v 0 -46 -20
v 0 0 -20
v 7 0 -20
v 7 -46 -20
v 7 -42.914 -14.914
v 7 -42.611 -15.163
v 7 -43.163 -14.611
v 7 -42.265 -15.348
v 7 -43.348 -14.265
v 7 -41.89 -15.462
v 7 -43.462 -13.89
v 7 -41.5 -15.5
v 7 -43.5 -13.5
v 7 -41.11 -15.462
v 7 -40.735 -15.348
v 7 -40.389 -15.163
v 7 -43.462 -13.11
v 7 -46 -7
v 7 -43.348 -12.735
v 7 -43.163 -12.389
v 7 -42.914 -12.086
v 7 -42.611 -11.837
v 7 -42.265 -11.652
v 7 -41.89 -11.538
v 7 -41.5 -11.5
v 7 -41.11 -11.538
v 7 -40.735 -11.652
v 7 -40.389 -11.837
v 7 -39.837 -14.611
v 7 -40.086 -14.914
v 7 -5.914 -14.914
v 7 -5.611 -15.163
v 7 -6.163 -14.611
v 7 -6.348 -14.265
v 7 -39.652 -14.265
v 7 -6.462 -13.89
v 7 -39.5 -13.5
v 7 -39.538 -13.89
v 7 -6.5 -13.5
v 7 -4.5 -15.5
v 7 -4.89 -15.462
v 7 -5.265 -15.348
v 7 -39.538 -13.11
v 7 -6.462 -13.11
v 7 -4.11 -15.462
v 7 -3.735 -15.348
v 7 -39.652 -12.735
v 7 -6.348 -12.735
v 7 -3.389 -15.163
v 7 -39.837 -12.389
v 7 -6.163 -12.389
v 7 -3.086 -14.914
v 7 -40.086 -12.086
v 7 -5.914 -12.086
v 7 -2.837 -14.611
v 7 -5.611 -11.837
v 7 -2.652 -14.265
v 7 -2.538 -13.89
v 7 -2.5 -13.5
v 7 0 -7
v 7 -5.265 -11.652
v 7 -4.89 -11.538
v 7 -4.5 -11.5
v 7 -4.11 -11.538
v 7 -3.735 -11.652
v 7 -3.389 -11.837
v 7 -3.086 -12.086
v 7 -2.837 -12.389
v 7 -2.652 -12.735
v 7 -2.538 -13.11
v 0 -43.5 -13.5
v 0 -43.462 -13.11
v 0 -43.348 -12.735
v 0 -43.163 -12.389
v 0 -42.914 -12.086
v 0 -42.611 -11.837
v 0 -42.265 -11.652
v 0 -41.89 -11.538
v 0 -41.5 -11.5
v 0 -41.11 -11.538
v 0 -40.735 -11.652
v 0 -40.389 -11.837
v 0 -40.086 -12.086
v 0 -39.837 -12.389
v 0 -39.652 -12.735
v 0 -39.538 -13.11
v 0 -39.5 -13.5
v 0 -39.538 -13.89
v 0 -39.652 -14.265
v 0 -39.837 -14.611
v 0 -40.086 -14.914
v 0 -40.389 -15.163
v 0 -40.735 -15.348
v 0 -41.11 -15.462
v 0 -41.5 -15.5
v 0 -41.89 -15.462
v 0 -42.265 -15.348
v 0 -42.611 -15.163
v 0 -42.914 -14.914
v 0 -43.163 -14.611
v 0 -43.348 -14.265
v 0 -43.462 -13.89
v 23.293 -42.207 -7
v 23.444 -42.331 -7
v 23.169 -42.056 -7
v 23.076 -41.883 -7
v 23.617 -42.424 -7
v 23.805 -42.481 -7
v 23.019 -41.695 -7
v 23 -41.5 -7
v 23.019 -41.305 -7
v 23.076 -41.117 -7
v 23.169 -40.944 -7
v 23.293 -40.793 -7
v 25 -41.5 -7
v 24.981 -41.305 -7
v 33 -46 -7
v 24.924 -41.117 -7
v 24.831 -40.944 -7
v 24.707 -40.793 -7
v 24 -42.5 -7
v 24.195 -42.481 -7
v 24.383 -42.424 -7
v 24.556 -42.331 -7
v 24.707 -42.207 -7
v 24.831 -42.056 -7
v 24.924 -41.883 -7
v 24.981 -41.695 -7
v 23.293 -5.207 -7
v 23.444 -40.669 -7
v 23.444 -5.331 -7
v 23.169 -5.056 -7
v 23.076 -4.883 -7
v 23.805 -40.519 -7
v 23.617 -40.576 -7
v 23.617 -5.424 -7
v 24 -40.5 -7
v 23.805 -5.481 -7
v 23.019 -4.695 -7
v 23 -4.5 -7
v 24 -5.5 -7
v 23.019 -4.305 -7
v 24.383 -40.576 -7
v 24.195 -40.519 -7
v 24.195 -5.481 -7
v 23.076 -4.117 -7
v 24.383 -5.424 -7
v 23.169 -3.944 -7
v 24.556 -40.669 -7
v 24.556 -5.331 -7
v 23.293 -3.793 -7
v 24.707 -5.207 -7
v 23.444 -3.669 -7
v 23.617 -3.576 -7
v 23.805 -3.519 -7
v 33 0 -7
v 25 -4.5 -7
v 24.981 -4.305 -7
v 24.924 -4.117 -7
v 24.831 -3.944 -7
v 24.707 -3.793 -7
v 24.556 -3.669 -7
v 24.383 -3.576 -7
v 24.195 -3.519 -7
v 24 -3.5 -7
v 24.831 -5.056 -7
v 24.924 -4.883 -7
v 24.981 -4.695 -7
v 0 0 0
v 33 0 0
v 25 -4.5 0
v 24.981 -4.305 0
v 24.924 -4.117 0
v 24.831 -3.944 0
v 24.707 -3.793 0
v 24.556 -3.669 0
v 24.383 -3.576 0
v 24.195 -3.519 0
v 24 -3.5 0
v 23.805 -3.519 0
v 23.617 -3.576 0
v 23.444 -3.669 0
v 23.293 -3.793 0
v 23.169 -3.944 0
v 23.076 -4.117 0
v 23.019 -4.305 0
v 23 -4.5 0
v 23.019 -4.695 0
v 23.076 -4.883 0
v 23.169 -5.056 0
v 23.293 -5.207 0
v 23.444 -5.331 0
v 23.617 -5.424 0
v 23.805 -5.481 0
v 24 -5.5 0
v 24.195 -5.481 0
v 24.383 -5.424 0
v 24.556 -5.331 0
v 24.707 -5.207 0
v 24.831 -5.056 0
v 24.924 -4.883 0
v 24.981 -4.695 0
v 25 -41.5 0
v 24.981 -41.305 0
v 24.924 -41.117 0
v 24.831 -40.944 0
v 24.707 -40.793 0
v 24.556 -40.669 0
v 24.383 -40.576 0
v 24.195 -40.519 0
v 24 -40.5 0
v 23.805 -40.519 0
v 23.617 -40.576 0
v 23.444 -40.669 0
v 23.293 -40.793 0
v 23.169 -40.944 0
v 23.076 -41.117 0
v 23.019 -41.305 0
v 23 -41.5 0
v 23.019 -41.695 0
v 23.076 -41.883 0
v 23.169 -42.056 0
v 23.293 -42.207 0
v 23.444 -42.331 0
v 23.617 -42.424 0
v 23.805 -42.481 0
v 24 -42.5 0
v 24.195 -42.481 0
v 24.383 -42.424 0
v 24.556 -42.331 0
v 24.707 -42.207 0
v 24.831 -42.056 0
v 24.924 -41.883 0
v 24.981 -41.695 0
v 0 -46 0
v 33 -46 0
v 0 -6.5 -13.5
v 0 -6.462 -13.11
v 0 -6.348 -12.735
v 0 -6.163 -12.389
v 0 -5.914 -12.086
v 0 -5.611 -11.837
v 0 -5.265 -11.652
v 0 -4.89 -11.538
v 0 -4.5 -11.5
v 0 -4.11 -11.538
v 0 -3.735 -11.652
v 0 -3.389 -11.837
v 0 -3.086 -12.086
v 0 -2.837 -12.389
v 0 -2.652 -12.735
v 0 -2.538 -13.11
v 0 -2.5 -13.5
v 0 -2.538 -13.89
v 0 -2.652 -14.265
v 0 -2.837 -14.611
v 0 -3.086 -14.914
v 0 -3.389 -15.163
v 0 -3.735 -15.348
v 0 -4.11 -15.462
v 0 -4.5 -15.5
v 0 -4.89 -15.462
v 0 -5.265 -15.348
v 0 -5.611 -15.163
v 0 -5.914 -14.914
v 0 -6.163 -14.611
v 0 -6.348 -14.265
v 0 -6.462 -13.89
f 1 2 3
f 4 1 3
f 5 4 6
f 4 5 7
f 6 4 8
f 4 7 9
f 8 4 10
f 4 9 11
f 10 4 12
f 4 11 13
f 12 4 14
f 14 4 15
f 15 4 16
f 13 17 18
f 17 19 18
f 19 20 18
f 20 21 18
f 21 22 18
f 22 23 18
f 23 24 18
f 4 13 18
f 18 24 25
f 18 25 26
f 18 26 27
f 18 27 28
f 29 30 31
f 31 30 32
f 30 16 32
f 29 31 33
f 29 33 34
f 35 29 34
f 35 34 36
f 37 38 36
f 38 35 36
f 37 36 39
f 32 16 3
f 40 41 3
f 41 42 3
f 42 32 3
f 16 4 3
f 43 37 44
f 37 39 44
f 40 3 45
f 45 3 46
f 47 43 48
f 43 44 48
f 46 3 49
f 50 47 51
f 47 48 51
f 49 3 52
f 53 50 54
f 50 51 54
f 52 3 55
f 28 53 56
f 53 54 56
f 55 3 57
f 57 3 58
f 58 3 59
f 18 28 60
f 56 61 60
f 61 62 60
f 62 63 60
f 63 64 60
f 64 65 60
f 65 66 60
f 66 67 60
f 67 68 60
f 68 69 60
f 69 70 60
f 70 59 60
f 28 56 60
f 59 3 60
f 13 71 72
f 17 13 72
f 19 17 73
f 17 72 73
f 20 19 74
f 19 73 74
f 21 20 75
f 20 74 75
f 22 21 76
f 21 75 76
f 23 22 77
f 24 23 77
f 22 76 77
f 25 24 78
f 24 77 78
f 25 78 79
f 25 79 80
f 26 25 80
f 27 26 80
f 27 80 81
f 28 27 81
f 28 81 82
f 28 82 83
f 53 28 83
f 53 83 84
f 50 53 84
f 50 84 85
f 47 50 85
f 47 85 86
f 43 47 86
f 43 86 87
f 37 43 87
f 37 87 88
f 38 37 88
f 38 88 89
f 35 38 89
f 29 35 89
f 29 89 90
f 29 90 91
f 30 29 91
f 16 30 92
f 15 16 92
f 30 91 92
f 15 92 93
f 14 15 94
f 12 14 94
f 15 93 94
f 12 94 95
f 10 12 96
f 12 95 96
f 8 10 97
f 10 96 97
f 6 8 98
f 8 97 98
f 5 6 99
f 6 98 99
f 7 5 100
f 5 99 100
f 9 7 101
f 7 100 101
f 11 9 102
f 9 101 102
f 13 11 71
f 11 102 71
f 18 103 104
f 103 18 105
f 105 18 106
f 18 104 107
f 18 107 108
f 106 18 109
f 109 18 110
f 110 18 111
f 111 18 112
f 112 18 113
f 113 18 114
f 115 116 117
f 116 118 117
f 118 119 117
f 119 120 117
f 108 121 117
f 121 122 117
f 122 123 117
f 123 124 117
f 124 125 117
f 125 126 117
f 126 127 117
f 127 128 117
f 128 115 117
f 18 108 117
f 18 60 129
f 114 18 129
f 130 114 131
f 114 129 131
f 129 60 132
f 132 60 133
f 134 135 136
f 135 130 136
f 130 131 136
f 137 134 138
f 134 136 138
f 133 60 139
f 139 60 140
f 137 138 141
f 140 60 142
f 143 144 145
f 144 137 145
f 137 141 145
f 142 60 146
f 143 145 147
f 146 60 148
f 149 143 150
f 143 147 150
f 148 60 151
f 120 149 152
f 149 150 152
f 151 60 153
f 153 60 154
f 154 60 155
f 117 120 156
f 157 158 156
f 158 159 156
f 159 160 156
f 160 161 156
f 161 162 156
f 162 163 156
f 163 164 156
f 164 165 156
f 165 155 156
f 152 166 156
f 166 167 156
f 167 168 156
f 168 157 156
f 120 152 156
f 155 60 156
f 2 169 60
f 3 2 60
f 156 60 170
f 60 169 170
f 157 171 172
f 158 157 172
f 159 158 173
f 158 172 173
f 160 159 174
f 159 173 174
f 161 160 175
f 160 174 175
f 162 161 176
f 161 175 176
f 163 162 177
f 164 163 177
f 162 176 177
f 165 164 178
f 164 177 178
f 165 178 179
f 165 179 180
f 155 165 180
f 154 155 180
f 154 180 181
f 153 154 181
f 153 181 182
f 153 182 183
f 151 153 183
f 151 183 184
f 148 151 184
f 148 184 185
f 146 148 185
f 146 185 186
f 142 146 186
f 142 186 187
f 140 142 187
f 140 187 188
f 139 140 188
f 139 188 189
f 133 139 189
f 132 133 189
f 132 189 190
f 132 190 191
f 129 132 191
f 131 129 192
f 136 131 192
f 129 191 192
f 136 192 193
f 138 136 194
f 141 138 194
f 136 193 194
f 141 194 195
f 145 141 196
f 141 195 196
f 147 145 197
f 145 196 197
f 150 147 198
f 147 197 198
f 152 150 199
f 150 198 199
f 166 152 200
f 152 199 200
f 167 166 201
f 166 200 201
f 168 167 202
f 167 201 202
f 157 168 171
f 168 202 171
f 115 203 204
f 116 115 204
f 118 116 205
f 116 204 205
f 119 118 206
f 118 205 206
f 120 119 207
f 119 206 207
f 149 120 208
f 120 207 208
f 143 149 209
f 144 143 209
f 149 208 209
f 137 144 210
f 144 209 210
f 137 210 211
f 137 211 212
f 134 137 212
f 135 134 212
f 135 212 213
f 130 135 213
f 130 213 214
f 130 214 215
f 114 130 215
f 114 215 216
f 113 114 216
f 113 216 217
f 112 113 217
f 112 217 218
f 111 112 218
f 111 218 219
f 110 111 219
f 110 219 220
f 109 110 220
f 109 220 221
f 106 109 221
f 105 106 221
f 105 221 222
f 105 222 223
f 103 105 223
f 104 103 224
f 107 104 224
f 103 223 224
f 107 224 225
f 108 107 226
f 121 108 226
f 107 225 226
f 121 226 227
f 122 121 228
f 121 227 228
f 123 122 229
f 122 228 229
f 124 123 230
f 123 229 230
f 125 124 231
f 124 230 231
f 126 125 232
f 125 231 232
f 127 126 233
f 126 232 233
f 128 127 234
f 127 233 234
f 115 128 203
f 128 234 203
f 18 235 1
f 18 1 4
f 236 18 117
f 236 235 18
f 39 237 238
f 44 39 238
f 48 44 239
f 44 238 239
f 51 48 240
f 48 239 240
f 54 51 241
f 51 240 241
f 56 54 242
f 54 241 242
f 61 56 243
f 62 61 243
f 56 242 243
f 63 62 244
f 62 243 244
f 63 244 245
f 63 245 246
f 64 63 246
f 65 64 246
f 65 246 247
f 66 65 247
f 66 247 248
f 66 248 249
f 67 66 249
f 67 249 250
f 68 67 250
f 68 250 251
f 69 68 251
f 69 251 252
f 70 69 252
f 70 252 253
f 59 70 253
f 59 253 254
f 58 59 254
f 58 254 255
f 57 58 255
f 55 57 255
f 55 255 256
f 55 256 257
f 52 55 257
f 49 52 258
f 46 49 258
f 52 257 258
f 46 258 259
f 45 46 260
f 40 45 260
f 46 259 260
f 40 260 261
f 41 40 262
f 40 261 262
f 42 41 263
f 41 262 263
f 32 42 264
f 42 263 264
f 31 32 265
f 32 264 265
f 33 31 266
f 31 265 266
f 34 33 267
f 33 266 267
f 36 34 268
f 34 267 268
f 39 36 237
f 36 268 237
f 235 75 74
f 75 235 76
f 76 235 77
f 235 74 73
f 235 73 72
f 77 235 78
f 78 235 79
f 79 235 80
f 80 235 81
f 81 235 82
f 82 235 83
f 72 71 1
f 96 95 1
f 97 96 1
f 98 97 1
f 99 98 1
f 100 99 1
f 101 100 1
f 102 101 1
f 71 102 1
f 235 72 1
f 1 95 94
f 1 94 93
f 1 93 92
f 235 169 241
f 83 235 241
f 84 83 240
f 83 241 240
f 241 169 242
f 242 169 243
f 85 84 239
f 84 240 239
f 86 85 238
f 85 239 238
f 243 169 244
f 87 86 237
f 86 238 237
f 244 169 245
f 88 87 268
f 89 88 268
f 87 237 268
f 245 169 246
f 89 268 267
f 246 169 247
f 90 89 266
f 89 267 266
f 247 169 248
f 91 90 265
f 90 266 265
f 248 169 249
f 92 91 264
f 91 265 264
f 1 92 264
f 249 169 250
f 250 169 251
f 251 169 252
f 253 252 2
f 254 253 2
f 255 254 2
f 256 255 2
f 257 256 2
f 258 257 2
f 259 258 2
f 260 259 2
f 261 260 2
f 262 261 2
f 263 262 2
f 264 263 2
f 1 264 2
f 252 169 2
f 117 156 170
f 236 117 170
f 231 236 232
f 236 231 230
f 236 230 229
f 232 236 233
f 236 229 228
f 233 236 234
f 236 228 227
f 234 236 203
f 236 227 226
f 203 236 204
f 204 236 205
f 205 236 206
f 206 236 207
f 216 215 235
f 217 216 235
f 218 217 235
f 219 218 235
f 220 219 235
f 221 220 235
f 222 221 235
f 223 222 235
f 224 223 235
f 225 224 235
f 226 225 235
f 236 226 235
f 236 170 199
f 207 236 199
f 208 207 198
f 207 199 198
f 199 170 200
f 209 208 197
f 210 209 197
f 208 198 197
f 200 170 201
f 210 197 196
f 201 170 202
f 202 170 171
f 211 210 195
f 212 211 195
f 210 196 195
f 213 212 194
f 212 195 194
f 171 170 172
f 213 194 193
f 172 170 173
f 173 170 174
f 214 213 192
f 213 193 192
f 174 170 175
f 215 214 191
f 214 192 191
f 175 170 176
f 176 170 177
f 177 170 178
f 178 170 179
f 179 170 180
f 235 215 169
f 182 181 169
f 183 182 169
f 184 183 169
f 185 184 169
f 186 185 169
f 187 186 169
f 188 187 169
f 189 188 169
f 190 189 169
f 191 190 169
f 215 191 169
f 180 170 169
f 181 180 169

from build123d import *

# Parameters (mm, degrees)
F1_DEPTH = 46
F2_R     = 1
F3_DEPTH = 20.001
F5_D     = 4


with BuildPart() as f1:
    # F0 (on Front) → F1 (new body)
    with BuildSketch(Plane.XZ):
        Polygon((33, 0), (0, 0), (0, -20), (7, -20), (7, -7), (33, -7), align=None)
    extrude(amount=F1_DEPTH)

    # F2 (on face) → F3 (cut, through all)
    with BuildSketch(Plane.XY):
        with Locations((24, -4.5)):
            Circle(F2_R)
        with Locations((24, -41.5)):
            Circle(F2_R)
    extrude(amount=-F3_DEPTH, mode=Mode.SUBTRACT)

    # F5 (through all)
    with Locations(Plane.YZ.offset(7)):
        with Locations((-41.5, -13.5), (-4.5, -13.5)):
            Hole(F5_D / 2)


solid = f1.part
